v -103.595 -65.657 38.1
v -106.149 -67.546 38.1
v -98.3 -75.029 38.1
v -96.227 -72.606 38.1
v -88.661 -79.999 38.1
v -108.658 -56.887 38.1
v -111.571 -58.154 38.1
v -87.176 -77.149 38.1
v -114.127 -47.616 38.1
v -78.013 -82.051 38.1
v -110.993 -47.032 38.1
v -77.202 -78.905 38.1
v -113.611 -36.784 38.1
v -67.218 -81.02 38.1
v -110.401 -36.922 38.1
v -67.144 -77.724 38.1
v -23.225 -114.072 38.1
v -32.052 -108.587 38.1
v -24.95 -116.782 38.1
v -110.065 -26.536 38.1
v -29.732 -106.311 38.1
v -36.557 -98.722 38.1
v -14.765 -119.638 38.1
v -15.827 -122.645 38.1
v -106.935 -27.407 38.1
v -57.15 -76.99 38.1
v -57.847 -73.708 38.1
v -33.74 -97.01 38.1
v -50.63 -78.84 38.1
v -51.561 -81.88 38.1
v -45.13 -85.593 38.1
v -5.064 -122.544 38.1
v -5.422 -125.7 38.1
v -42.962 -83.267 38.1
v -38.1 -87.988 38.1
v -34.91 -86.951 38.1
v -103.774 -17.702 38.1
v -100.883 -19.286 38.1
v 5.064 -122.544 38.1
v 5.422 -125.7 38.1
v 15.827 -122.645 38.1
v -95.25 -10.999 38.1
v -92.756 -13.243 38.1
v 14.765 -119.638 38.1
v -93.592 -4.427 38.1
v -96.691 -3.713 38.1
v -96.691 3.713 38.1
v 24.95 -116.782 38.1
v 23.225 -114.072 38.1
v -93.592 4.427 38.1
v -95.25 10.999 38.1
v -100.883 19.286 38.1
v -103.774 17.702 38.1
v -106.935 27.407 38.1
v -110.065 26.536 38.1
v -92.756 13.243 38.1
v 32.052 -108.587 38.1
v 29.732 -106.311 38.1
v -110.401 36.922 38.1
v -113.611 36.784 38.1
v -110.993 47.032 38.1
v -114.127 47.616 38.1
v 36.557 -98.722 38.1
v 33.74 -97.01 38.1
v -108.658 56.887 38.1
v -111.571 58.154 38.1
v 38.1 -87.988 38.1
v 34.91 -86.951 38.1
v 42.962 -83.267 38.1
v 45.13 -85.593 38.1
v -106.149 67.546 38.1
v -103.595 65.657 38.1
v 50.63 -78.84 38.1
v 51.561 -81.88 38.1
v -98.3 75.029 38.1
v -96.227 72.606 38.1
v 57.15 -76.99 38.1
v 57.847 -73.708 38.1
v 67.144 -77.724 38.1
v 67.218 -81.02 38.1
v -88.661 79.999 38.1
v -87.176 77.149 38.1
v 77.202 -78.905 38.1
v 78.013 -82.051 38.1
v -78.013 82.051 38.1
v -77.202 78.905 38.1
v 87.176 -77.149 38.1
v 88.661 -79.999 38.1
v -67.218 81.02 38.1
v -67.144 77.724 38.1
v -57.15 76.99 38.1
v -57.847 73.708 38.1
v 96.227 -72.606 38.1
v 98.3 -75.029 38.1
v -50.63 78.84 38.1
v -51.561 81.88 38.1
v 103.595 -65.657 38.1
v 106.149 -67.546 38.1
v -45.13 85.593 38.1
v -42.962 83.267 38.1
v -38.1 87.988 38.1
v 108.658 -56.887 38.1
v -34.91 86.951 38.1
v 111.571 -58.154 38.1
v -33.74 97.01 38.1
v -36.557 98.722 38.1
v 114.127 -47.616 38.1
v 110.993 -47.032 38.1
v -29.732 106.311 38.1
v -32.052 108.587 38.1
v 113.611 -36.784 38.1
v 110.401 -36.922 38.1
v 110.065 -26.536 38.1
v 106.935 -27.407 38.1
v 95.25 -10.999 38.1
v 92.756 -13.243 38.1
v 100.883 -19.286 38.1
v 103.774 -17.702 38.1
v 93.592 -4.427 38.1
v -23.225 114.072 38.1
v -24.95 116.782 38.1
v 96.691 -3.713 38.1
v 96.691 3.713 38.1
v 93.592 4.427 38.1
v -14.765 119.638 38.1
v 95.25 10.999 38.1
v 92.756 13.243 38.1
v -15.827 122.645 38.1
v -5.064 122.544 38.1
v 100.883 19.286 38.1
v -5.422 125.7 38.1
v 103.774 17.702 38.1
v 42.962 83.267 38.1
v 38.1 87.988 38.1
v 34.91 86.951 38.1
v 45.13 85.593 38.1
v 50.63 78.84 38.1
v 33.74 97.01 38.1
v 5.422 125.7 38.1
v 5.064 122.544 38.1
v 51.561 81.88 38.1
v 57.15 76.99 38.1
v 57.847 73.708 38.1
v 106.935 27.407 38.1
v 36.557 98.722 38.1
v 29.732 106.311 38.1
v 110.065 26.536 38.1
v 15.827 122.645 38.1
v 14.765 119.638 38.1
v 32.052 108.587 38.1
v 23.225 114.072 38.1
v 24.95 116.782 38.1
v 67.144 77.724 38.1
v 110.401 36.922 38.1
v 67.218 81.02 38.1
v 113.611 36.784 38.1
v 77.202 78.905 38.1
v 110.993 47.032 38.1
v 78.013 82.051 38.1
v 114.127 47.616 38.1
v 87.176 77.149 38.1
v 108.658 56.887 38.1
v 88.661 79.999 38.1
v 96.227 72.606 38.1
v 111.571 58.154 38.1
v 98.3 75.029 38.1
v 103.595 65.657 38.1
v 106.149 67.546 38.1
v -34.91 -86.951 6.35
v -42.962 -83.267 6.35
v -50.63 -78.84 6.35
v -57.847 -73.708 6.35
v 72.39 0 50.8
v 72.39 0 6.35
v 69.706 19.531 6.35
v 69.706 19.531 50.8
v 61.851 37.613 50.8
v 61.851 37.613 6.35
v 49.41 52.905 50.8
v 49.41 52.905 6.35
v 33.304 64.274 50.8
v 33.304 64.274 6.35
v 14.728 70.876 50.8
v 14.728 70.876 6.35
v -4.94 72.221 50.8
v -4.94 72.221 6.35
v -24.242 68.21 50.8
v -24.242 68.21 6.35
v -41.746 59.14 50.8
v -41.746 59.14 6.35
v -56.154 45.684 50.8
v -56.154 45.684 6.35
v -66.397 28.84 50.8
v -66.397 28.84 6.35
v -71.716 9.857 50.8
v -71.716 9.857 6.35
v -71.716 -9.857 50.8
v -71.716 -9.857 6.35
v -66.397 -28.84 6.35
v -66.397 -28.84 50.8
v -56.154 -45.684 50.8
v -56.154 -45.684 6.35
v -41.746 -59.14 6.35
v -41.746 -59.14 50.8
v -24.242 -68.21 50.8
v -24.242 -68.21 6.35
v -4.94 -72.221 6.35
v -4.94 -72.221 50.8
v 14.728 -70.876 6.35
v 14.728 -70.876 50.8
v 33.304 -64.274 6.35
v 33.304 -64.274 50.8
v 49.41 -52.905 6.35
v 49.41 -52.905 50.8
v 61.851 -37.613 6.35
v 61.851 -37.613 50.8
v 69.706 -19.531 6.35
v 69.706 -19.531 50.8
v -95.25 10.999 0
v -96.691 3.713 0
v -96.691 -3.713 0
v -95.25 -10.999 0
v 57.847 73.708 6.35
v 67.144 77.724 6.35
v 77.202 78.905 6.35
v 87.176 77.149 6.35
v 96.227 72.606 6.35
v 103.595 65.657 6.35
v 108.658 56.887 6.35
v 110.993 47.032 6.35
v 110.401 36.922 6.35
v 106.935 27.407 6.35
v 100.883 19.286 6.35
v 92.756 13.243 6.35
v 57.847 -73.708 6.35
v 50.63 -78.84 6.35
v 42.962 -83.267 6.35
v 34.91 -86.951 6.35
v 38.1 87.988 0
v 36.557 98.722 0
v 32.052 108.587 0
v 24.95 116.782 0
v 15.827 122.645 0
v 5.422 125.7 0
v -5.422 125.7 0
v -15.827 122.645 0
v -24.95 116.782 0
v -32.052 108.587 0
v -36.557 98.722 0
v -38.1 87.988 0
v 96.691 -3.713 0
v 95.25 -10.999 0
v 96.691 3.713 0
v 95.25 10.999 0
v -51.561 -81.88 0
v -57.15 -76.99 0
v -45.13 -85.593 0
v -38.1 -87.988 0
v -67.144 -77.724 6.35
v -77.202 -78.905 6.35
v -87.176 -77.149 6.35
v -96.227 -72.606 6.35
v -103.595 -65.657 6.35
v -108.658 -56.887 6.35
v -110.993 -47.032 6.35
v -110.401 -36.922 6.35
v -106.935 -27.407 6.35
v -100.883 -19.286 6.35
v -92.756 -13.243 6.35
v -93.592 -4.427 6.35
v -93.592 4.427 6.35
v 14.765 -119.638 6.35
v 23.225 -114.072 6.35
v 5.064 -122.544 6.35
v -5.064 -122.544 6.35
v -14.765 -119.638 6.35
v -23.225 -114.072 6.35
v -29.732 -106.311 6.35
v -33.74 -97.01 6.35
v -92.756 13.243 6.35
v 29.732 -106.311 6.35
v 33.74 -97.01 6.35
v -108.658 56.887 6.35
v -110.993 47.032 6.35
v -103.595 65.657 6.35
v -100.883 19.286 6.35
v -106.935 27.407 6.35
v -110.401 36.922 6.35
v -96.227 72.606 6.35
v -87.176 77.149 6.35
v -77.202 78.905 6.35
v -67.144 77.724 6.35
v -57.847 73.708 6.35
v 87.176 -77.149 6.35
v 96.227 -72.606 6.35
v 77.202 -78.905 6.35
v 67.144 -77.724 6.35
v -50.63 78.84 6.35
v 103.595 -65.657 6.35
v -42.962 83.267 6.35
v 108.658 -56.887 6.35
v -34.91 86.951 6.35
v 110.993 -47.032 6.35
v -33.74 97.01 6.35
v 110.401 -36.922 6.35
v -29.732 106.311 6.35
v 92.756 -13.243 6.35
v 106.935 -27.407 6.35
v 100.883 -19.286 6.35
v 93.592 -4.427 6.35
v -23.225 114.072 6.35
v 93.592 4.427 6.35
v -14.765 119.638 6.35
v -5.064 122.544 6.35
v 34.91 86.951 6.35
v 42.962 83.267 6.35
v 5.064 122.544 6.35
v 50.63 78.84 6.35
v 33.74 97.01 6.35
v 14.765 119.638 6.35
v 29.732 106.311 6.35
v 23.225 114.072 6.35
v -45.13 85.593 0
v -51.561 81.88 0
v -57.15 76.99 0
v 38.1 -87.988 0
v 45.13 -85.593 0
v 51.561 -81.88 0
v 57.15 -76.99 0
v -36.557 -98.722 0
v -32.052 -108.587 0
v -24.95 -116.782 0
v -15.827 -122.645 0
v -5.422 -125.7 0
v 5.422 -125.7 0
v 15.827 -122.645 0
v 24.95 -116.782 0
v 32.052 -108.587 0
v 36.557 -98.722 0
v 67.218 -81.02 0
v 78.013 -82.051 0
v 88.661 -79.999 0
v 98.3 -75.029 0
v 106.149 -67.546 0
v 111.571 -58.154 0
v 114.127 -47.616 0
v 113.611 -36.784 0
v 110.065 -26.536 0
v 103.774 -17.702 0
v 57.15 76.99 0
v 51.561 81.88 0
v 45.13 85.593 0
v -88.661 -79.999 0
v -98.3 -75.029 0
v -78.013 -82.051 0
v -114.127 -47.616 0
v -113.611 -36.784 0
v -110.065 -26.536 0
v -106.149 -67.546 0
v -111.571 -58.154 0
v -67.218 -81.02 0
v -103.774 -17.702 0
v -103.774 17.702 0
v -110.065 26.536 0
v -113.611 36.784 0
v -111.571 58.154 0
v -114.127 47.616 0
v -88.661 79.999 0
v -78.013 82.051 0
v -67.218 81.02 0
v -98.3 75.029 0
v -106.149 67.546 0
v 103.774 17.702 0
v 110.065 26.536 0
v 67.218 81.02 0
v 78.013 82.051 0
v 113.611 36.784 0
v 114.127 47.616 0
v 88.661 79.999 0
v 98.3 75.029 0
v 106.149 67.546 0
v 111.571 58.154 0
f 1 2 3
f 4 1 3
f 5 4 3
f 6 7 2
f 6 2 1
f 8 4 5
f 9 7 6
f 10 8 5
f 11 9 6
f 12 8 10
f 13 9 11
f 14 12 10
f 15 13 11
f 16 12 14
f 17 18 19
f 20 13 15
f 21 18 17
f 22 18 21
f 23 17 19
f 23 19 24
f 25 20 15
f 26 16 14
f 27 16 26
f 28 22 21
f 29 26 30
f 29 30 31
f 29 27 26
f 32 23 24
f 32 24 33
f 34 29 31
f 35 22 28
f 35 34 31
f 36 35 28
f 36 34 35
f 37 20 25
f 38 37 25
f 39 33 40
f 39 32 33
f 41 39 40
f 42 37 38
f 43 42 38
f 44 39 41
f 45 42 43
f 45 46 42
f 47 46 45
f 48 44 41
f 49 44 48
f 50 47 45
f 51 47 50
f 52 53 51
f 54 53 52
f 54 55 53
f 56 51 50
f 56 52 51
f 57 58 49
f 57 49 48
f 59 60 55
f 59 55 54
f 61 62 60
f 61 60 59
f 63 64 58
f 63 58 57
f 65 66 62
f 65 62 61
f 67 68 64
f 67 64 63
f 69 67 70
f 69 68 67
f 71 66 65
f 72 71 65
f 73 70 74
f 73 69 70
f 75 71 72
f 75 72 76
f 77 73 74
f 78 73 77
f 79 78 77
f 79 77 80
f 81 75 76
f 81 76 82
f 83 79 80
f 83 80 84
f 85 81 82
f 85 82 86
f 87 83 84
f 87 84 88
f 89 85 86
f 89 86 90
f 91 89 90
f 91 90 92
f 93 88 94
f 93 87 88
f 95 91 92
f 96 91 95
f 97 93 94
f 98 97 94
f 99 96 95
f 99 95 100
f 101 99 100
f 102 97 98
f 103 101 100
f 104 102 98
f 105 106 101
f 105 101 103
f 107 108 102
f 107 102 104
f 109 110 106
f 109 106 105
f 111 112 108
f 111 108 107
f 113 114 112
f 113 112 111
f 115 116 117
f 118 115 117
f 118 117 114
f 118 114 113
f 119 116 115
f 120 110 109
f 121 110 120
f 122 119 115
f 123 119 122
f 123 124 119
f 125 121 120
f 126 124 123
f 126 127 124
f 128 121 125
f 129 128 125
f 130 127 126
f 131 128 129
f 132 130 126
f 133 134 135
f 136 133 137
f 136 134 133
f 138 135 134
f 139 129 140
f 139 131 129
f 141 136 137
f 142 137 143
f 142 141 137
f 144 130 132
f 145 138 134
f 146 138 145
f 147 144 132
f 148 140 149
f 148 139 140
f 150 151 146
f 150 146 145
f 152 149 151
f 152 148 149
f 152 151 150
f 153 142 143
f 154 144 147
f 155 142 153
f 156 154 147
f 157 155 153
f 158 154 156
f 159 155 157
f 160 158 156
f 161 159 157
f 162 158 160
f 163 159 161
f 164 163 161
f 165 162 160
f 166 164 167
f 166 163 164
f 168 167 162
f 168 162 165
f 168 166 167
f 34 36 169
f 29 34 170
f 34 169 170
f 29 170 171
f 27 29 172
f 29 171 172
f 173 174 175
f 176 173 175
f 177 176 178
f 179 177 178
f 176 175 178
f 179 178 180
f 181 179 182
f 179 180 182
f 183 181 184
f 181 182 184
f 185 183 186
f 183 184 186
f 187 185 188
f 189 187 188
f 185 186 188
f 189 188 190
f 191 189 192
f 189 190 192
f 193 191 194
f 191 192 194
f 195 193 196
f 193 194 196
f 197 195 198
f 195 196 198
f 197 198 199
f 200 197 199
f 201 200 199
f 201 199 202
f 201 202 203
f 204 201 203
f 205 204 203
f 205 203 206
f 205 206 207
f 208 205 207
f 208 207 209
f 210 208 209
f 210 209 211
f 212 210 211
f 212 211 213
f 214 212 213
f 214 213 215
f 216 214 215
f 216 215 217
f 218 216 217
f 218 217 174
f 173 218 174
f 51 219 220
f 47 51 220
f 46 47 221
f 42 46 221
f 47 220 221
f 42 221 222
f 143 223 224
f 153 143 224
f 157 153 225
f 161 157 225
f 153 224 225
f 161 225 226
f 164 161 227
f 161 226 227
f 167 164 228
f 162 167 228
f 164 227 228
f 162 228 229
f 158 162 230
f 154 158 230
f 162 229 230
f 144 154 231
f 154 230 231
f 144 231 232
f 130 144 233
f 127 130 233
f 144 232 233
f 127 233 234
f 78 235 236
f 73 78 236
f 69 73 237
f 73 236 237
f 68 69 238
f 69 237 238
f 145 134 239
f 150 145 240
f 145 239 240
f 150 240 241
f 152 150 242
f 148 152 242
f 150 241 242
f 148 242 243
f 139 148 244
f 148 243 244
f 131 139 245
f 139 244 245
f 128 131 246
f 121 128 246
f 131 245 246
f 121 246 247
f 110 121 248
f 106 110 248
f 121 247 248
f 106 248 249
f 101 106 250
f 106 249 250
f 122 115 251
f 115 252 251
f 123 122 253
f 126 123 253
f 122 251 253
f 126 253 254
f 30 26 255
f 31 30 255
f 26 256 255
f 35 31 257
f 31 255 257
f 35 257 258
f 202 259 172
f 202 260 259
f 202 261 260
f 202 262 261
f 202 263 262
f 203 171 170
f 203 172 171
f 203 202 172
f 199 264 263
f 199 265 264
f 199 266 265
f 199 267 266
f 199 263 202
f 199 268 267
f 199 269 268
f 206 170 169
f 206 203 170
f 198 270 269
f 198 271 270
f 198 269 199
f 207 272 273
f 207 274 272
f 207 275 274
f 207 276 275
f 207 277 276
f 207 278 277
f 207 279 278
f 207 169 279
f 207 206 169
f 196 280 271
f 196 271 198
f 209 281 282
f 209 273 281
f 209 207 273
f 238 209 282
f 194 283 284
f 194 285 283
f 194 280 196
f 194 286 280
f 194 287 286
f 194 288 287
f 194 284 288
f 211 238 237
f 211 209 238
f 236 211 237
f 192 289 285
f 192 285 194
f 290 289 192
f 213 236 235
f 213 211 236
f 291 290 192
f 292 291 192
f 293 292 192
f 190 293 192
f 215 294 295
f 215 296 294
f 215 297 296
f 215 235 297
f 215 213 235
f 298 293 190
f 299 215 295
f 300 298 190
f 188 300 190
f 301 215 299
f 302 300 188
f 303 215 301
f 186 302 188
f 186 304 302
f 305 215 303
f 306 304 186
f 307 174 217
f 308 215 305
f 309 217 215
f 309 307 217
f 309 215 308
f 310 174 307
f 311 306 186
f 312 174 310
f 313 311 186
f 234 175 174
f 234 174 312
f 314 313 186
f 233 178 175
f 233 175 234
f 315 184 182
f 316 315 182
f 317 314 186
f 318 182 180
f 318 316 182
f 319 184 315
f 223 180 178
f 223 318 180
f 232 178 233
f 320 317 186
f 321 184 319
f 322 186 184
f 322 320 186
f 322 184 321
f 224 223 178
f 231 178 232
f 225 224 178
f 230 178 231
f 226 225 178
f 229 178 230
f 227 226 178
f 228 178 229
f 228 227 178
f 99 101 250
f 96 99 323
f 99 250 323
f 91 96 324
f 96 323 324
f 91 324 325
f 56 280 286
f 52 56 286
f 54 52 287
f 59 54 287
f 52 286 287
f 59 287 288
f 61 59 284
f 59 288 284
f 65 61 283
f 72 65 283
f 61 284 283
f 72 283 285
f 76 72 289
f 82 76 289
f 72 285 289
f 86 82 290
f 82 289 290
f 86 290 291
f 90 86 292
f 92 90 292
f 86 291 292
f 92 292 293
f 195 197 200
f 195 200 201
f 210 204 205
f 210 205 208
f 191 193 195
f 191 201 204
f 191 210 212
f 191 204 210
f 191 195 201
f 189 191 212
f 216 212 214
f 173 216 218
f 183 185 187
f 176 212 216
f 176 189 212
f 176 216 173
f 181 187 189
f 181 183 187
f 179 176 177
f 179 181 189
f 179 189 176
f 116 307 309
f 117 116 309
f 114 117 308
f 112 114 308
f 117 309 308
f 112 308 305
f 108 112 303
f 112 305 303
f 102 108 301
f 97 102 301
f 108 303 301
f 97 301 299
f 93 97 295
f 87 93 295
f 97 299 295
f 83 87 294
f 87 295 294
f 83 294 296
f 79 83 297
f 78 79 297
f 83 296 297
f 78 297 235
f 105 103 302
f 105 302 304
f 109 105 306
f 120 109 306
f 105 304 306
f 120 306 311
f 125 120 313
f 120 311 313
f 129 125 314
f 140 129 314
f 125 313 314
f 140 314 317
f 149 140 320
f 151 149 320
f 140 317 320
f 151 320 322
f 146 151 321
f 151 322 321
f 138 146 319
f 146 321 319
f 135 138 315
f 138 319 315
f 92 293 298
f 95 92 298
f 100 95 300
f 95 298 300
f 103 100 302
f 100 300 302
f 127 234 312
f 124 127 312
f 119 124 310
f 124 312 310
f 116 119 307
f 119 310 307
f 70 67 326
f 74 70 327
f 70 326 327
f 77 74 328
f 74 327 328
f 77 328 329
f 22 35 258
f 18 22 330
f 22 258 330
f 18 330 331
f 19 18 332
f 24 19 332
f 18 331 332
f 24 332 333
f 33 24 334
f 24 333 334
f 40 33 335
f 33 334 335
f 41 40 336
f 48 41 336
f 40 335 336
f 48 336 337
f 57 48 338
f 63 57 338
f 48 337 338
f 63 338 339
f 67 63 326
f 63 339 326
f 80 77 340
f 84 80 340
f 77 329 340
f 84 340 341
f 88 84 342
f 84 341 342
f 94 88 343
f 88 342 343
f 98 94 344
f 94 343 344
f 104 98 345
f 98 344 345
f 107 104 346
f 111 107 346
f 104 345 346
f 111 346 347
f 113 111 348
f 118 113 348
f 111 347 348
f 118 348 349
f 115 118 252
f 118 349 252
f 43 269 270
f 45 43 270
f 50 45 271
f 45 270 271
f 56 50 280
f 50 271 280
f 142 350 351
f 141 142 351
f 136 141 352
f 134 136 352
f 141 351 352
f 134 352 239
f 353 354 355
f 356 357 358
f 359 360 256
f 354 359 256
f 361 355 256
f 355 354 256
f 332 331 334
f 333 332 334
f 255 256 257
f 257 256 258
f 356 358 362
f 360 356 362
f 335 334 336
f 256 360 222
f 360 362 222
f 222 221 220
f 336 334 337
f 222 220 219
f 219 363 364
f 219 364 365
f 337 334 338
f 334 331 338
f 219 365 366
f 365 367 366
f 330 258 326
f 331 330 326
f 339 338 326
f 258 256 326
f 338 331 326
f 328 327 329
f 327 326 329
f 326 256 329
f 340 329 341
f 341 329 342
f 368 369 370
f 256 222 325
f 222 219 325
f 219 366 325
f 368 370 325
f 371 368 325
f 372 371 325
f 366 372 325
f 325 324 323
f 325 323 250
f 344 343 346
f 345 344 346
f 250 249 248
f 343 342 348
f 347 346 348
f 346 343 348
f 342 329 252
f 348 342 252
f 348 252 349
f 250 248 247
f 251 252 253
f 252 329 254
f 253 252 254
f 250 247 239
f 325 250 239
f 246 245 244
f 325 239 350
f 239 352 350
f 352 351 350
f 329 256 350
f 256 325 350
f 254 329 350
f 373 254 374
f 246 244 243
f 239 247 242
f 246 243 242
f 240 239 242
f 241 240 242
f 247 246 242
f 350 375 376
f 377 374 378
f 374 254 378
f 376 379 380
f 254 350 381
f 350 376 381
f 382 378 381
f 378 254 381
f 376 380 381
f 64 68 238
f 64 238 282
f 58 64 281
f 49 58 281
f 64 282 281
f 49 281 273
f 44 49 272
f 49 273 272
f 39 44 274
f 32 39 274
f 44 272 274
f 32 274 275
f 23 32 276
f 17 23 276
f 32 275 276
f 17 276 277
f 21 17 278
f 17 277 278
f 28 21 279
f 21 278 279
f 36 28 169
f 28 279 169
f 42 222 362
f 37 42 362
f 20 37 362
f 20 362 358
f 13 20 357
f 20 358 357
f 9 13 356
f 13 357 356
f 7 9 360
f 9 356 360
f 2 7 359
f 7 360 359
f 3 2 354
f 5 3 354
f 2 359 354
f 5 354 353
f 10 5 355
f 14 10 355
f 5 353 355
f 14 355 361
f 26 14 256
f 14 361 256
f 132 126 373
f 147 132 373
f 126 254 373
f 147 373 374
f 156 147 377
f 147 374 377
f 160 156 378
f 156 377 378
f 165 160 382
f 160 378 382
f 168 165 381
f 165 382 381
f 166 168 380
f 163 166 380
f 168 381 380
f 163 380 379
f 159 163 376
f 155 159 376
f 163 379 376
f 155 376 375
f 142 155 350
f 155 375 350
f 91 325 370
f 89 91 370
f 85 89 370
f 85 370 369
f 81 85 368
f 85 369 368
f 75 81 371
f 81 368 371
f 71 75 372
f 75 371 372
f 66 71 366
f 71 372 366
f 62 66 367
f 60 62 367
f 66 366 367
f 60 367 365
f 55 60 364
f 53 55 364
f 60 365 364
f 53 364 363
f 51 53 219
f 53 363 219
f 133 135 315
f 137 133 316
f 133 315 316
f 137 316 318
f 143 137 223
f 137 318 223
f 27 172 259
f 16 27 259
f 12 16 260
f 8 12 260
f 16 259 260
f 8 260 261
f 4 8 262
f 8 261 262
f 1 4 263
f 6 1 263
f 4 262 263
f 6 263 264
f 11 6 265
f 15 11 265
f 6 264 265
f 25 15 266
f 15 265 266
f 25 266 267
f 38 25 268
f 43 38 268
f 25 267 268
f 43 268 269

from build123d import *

# Parameters (mm, degrees)
F0_R        = 72.39
F1_DEPTH    = 6.35
F2_DEPTH    = 50.8
F3_T1_DEPTH = 69.85
F5_DEPTH    = 31.75


# Not quite as in the source:
# - a fillet or chamfer that OpenCascade refuses, or shapes differently, is made with other operations: its cross-section is extruded or revolved along the edge and cut away or added


with BuildPart() as f1:
    # F0 (on Top) → F1 (new body)
    with BuildSketch(Plane.XY):
        with BuildLine():
            Line((38.1, -87.9881810245), (50.8, -87.9881810245))
            Line((50.8, -87.9881810245), (57.15, -76.9896583964))
            ThreePointArc((57.15, -76.9896583964), (109.1955678842, -63.0440905122), (95.25, -10.9985226281))
            Line((95.25, -10.9985226281), (101.6, 0))
            Line((101.6, 0), (95.25, 10.9985226281))
            ThreePointArc((95.25, 10.9985226281), (109.1955678842, 63.0440905122), (57.15, 76.9896583964))
            Line((57.15, 76.9896583964), (50.8, 87.9881810245))
            Line((50.8, 87.9881810245), (38.1, 87.9881810245))
            ThreePointArc((38.1, 87.9881810245), (0, 126.0881810245), (-38.1, 87.9881810245))
            Line((-38.1, 87.9881810245), (-50.8, 87.9881810245))
            Line((-50.8, 87.9881810245), (-57.15, 76.9896583964))
            ThreePointArc((-57.15, 76.9896583964), (-109.1955678842, 63.0440905122), (-95.25, 10.9985226281))
            Line((-95.25, 10.9985226281), (-101.6, 0))
            Line((-101.6, 0), (-95.25, -10.9985226281))
            ThreePointArc((-95.25, -10.9985226281), (-109.1955678842, -63.0440905122), (-57.15, -76.9896583964))
            Line((-57.15, -76.9896583964), (-50.8, -87.9881810245))
            Line((-50.8, -87.9881810245), (-38.1, -87.9881810245))
            ThreePointArc((-38.1, -87.9881810245), (0, -126.0881810245), (38.1, -87.9881810245))
        make_face()
        Circle(F0_R, mode=Mode.SUBTRACT)
    extrude(amount=F1_DEPTH)

    # F0 (on Top) → F2 (join)
    with BuildSketch(Plane.XY):
        Circle(F0_R)
    extrude(amount=F2_DEPTH)

    # F3: fillet of radius 38.1 on 6 edges, made by hand

    # F3_s2 → F3_t1 (cut)
    with BuildSketch(Plane.XY.offset(-31.75)):
        with BuildLine():
            ThreePointArc((57.15, 76.9896583964), (48.4360135972, 83.8936364665), (38.1, 87.9881810245))
            Line((38.1, 87.9881810245), (50.8, 87.9881810245))
            Line((50.8, 87.9881810245), (57.15, 76.9896583964))
        make_face()
        with BuildLine():
            ThreePointArc((95.25, -10.9985226281), (96.8720271945, 0), (95.25, 10.9985226281))
            Line((95.25, 10.9985226281), (101.6, 0))
            Line((101.6, 0), (95.25, -10.9985226281))
        make_face()
        with BuildLine():
            ThreePointArc((38.1, -87.9881810245), (48.4360135972, -83.8936364665), (57.15, -76.9896583964))
            Line((57.15, -76.9896583964), (50.8, -87.9881810245))
            Line((50.8, -87.9881810245), (38.1, -87.9881810245))
        make_face()
        with BuildLine():
            ThreePointArc((-38.1, -87.9881810245), (-48.4360135972, -83.8936364665), (-57.15, -76.9896583964))
            Line((-57.15, -76.9896583964), (-50.8, -87.9881810245))
            Line((-50.8, -87.9881810245), (-38.1, -87.9881810245))
        make_face()
        with BuildLine():
            ThreePointArc((-95.25, 10.9985226281), (-96.8720271945, 0), (-95.25, -10.9985226281))
            Line((-95.25, -10.9985226281), (-101.6, 0))
            Line((-101.6, 0), (-95.25, 10.9985226281))
        make_face()
        with BuildLine():
            ThreePointArc((-38.1, 87.9881810245), (-48.4360135972, 83.8936364665), (-57.15, 76.9896583964))
            Line((-57.15, 76.9896583964), (-50.8, 87.9881810245))
            Line((-50.8, 87.9881810245), (-38.1, 87.9881810245))
        make_face()
    extrude(amount=F3_T1_DEPTH, mode=Mode.SUBTRACT)

    # F4 (on face) → F5 (join)
    with BuildSketch(Plane.XY.offset(6.35)):
        with BuildLine():
            ThreePointArc((-95.25, -10.9985226281), (-109.1955678842, -63.0440905122), (-57.15, -76.9896583964))
            ThreePointArc((-57.15, -76.9896583964), (-48.4360135972, -83.8936364665), (-38.1, -87.9881810245))
            ThreePointArc((-38.1, -87.9881810245), (0, -126.0881810245), (38.1, -87.9881810245))
            ThreePointArc((38.1, -87.9881810245), (48.4360135972, -83.8936364665), (57.15, -76.9896583964))
            ThreePointArc((57.15, -76.9896583964), (109.1955678842, -63.0440905122), (95.25, -10.9985226281))
            ThreePointArc((95.25, -10.9985226281), (96.8720271945, 0), (95.25, 10.9985226281))
            ThreePointArc((95.25, 10.9985226281), (109.1955678842, 63.0440905122), (57.15, 76.9896583964))
            ThreePointArc((57.15, 76.9896583964), (48.4360135972, 83.8936364665), (38.1, 87.9881810245))
            ThreePointArc((38.1, 87.9881810245), (0, 126.0881810245), (-38.1, 87.9881810245))
            ThreePointArc((-38.1, 87.9881810245), (-48.4360135972, 83.8936364665), (-57.15, 76.9896583964))
            ThreePointArc((-57.15, 76.9896583964), (-109.1955678842, 63.0440905122), (-95.25, 10.9985226281))
            ThreePointArc((-95.25, 10.9985226281), (-96.8720271945, 0), (-95.25, -10.9985226281))
        make_face()
        with BuildLine():
            ThreePointArc((-92.7564557809, 13.2428401804), (-106.4459372272, 61.4565905122), (-57.8468639049, 73.7080269811))
            ThreePointArc((-57.8468639049, 73.7080269811), (-46.8485135972, 81.1440058095), (-34.909591876, 86.9508671615))
            ThreePointArc((-34.909591876, 86.9508671615), (0, 122.9131810245), (34.909591876, 86.9508671615))
            ThreePointArc((34.909591876, 86.9508671615), (46.8485135972, 81.1440058095), (57.8468639049, 73.7080269811))
            ThreePointArc((57.8468639049, 73.7080269811), (106.4459372272, 61.4565905122), (92.7564557809, 13.2428401804))
            ThreePointArc((92.7564557809, 13.2428401804), (93.6970271945, 0), (92.7564557809, -13.2428401804))
            ThreePointArc((92.7564557809, -13.2428401804), (106.4459372272, -61.4565905122), (57.8468639049, -73.7080269811))
            ThreePointArc((57.8468639049, -73.7080269811), (46.8485135972, -81.1440058095), (34.909591876, -86.9508671615))
            ThreePointArc((34.909591876, -86.9508671615), (0, -122.9131810245), (-34.909591876, -86.9508671615))
            ThreePointArc((-34.909591876, -86.9508671615), (-46.8485135972, -81.1440058095), (-57.8468639049, -73.7080269811))
            ThreePointArc((-57.8468639049, -73.7080269811), (-106.4459372272, -61.4565905122), (-92.7564557809, -13.2428401804))
            ThreePointArc((-92.7564557809, -13.2428401804), (-93.6970271945, 0), (-92.7564557809, 13.2428401804))
        make_face(mode=Mode.SUBTRACT)
    extrude(amount=F5_DEPTH)


solid = f1.part
